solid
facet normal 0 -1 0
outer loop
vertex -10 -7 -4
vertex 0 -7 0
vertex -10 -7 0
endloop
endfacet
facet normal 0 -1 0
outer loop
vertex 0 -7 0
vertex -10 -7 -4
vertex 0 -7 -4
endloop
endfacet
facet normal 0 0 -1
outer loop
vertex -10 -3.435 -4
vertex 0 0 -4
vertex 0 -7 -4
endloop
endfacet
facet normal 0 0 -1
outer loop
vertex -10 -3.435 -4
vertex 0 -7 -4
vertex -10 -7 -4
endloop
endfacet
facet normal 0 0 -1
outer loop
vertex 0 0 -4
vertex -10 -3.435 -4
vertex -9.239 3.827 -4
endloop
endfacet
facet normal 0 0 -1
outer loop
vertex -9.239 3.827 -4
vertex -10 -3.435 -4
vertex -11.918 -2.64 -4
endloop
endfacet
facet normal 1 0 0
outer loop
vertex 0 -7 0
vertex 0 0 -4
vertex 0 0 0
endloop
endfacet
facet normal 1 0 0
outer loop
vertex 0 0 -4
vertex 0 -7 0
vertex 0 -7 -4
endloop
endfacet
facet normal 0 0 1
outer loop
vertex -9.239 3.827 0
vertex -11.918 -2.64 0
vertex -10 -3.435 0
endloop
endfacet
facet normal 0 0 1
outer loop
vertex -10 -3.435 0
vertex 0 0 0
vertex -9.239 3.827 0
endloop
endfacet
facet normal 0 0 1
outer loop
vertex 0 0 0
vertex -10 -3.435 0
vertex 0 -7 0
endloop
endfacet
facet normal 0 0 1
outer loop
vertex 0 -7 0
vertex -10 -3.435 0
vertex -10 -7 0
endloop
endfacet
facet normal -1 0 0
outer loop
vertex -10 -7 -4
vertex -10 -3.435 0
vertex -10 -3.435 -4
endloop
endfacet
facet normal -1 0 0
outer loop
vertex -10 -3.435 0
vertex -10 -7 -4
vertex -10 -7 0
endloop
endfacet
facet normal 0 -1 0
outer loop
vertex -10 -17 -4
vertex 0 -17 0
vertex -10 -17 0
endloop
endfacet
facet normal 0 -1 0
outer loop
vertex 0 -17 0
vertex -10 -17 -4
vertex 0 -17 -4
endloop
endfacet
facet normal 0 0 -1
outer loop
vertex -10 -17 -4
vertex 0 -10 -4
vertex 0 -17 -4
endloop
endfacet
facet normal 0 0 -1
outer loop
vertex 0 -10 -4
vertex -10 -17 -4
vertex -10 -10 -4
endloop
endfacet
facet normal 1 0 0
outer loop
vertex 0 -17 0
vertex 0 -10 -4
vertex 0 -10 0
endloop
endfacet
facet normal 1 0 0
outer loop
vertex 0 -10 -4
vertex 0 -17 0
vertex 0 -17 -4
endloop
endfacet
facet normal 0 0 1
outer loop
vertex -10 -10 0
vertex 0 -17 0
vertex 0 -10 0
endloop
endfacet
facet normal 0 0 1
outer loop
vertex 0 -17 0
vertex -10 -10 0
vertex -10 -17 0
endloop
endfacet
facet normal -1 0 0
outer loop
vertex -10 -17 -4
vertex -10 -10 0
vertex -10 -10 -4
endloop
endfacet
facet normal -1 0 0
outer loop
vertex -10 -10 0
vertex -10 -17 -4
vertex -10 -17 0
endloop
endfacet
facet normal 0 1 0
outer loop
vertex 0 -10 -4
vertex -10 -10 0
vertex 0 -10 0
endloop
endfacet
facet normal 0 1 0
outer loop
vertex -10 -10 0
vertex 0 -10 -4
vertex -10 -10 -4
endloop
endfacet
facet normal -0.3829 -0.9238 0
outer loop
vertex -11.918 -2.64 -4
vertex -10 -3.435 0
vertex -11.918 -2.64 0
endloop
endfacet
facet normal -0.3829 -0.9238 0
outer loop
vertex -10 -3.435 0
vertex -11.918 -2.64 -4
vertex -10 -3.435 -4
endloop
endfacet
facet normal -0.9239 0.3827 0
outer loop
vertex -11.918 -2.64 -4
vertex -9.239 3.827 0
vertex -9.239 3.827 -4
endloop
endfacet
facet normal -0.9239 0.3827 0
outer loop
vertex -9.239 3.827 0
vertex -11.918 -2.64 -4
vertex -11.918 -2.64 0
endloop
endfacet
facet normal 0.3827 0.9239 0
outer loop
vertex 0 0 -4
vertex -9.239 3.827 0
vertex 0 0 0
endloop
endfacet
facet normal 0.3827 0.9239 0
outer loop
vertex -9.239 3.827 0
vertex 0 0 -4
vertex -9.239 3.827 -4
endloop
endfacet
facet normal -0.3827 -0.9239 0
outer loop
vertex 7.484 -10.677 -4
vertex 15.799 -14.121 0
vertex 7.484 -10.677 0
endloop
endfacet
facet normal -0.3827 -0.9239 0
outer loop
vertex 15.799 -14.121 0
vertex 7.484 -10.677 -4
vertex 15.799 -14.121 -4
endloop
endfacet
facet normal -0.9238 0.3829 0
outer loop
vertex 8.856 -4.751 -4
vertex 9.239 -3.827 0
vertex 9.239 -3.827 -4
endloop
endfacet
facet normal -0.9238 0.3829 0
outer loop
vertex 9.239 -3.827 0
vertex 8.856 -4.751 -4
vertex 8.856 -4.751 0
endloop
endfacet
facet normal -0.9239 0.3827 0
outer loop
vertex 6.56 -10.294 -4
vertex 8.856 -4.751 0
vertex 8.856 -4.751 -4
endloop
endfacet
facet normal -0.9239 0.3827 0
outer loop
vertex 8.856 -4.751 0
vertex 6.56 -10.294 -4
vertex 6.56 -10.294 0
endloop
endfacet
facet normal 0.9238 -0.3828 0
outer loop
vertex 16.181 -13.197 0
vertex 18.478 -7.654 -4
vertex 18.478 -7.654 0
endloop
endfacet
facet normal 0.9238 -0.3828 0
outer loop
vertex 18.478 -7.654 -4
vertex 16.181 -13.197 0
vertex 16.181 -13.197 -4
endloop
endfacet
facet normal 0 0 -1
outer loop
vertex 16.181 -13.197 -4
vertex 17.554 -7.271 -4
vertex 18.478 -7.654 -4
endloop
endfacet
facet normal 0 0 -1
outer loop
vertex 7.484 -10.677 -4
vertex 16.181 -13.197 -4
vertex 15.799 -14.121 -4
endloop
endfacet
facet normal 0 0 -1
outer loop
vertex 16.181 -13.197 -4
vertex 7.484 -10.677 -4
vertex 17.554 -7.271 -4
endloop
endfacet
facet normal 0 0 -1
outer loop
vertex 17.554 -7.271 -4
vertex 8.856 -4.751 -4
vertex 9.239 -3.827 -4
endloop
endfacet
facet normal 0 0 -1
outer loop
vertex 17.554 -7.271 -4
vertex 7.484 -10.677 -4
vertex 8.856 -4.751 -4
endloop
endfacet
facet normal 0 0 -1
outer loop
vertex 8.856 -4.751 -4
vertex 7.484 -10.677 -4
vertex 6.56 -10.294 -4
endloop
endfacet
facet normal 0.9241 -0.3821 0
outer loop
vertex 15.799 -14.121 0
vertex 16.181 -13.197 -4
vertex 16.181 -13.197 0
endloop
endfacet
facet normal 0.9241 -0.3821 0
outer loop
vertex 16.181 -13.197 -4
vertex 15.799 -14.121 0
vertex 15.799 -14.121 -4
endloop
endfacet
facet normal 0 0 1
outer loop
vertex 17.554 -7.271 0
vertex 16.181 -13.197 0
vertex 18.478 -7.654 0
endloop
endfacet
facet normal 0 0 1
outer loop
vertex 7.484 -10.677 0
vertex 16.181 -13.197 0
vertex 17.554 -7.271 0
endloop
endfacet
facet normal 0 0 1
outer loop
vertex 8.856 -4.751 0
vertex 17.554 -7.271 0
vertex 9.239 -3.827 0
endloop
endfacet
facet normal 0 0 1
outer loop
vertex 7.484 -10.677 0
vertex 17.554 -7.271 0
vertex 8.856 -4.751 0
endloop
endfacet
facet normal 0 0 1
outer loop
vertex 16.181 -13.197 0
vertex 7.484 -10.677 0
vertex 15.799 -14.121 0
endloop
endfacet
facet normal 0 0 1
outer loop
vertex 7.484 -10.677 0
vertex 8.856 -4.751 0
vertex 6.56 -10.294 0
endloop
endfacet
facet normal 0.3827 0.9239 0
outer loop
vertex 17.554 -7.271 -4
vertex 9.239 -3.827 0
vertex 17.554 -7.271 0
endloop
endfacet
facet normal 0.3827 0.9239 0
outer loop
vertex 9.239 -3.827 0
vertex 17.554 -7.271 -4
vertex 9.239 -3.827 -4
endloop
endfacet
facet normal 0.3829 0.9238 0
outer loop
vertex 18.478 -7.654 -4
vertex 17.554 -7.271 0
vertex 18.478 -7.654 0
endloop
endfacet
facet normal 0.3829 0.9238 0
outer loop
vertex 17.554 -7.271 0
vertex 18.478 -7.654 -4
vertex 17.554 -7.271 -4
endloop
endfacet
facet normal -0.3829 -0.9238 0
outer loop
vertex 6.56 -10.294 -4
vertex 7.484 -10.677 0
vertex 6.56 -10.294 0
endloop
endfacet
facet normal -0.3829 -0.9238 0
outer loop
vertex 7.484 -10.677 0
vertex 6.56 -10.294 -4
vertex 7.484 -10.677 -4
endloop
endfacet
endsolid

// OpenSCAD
$fn=7;
union()
{
	hull()
	{
		hull()
		{
			translate([-10,-7,-4])
			{
				rotate(0,[0,0,1])
				{
					cube([1,1,1]);
				}
			}
			translate([-10,-1,-4])
			{
				rotate(0,[0,0,1])
				{
					cube([1,1,1]);
				}
			}
			translate([-1,-1,-4])
			{
				rotate(0,[0,0,1])
				{
					cube([1,1,1]);
				}
			}
			translate([-1,-7,-4])
			{
				rotate(0,[0,0,1])
				{
					cube([1,1,1]);
				}
			}
		}
		hull()
		{
			translate([-10,-7,-1])
			{
				rotate(0,[0,0,1])
				{
					cube([1,1,1]);
				}
			}
			translate([-10,-1,-1])
			{
				rotate(0,[0,0,1])
				{
					cube([1,1,1]);
				}
			}
			translate([-1,-1,-1])
			{
				rotate(0,[0,0,1])
				{
					cube([1,1,1]);
				}
			}
			translate([-1,-7,-1])
			{
				rotate(0,[0,0,1])
				{
					cube([1,1,1]);
				}
			}
		}
	}
	hull()
	{
		hull()
		{
			translate([-10,-17,-4])
			{
				rotate(0,[0,0,1])
				{
					cube([1,1,1]);
				}
			}
			translate([-10,-11,-4])
			{
				rotate(0,[0,0,1])
				{
					cube([1,1,1]);
				}
			}
			translate([-1,-11,-4])
			{
				rotate(0,[0,0,1])
				{
					cube([1,1,1]);
				}
			}
			translate([-1,-17,-4])
			{
				rotate(0,[0,0,1])
				{
					cube([1,1,1]);
				}
			}
		}
		hull()
		{
			translate([-10,-17,-1])
			{
				rotate(0,[0,0,1])
				{
					cube([1,1,1]);
				}
			}
			translate([-10,-11,-1])
			{
				rotate(0,[0,0,1])
				{
					cube([1,1,1]);
				}
			}
			translate([-1,-11,-1])
			{
				rotate(0,[0,0,1])
				{
					cube([1,1,1]);
				}
			}
			translate([-1,-17,-1])
			{
				rotate(0,[0,0,1])
				{
					cube([1,1,1]);
				}
			}
		}
	}
	hull()
	{
		hull()
		{
			translate([-11.91758,-2.6403227,-4])
			{
				rotate(22.500015,[0,0,-1])
				{
					cube([1,1,1]);
				}
			}
			translate([-9.621479,2.9029546,-4])
			{
				rotate(22.500015,[0,0,-1])
				{
					cube([1,1,1]);
				}
			}
			translate([-1.3065629,-0.5411961,-4])
			{
				rotate(22.500015,[0,0,-1])
				{
					cube([1,1,1]);
				}
			}
			translate([-3.6026638,-6.084473,-4])
			{
				rotate(22.500015,[0,0,-1])
				{
					cube([1,1,1]);
				}
			}
		}
		hull()
		{
			translate([-11.91758,-2.6403227,-1])
			{
				rotate(22.500015,[0,0,-1])
				{
					cube([1,1,1]);
				}
			}
			translate([-9.621479,2.9029546,-1])
			{
				rotate(22.500015,[0,0,-1])
				{
					cube([1,1,1]);
				}
			}
			translate([-1.3065629,-0.5411961,-1])
			{
				rotate(22.500015,[0,0,-1])
				{
					cube([1,1,1]);
				}
			}
			translate([-3.6026638,-6.084473,-1])
			{
				rotate(22.500015,[0,0,-1])
				{
					cube([1,1,1]);
				}
			}
		}
	}
	hull()
	{
		hull()
		{
			translate([6.560011,-10.293991,-4])
			{
				rotate(22.500015,[0,0,-1])
				{
					cube([1,1,1]);
				}
			}
			translate([8.856112,-4.750714,-4])
			{
				rotate(22.500015,[0,0,-1])
				{
					cube([1,1,1]);
				}
			}
			translate([17.171028,-8.194864,-4])
			{
				rotate(22.500015,[0,0,-1])
				{
					cube([1,1,1]);
				}
			}
			translate([14.8749275,-13.738142,-4])
			{
				rotate(22.500015,[0,0,-1])
				{
					cube([1,1,1]);
				}
			}
		}
		hull()
		{
			translate([6.560011,-10.293991,-1])
			{
				rotate(22.500015,[0,0,-1])
				{
					cube([1,1,1]);
				}
			}
			translate([8.856112,-4.750714,-1])
			{
				rotate(22.500015,[0,0,-1])
				{
					cube([1,1,1]);
				}
			}
			translate([17.171028,-8.194864,-1])
			{
				rotate(22.500015,[0,0,-1])
				{
					cube([1,1,1]);
				}
			}
			translate([14.8749275,-13.738142,-1])
			{
				rotate(22.500015,[0,0,-1])
				{
					cube([1,1,1]);
				}
			}
		}
	}
}
